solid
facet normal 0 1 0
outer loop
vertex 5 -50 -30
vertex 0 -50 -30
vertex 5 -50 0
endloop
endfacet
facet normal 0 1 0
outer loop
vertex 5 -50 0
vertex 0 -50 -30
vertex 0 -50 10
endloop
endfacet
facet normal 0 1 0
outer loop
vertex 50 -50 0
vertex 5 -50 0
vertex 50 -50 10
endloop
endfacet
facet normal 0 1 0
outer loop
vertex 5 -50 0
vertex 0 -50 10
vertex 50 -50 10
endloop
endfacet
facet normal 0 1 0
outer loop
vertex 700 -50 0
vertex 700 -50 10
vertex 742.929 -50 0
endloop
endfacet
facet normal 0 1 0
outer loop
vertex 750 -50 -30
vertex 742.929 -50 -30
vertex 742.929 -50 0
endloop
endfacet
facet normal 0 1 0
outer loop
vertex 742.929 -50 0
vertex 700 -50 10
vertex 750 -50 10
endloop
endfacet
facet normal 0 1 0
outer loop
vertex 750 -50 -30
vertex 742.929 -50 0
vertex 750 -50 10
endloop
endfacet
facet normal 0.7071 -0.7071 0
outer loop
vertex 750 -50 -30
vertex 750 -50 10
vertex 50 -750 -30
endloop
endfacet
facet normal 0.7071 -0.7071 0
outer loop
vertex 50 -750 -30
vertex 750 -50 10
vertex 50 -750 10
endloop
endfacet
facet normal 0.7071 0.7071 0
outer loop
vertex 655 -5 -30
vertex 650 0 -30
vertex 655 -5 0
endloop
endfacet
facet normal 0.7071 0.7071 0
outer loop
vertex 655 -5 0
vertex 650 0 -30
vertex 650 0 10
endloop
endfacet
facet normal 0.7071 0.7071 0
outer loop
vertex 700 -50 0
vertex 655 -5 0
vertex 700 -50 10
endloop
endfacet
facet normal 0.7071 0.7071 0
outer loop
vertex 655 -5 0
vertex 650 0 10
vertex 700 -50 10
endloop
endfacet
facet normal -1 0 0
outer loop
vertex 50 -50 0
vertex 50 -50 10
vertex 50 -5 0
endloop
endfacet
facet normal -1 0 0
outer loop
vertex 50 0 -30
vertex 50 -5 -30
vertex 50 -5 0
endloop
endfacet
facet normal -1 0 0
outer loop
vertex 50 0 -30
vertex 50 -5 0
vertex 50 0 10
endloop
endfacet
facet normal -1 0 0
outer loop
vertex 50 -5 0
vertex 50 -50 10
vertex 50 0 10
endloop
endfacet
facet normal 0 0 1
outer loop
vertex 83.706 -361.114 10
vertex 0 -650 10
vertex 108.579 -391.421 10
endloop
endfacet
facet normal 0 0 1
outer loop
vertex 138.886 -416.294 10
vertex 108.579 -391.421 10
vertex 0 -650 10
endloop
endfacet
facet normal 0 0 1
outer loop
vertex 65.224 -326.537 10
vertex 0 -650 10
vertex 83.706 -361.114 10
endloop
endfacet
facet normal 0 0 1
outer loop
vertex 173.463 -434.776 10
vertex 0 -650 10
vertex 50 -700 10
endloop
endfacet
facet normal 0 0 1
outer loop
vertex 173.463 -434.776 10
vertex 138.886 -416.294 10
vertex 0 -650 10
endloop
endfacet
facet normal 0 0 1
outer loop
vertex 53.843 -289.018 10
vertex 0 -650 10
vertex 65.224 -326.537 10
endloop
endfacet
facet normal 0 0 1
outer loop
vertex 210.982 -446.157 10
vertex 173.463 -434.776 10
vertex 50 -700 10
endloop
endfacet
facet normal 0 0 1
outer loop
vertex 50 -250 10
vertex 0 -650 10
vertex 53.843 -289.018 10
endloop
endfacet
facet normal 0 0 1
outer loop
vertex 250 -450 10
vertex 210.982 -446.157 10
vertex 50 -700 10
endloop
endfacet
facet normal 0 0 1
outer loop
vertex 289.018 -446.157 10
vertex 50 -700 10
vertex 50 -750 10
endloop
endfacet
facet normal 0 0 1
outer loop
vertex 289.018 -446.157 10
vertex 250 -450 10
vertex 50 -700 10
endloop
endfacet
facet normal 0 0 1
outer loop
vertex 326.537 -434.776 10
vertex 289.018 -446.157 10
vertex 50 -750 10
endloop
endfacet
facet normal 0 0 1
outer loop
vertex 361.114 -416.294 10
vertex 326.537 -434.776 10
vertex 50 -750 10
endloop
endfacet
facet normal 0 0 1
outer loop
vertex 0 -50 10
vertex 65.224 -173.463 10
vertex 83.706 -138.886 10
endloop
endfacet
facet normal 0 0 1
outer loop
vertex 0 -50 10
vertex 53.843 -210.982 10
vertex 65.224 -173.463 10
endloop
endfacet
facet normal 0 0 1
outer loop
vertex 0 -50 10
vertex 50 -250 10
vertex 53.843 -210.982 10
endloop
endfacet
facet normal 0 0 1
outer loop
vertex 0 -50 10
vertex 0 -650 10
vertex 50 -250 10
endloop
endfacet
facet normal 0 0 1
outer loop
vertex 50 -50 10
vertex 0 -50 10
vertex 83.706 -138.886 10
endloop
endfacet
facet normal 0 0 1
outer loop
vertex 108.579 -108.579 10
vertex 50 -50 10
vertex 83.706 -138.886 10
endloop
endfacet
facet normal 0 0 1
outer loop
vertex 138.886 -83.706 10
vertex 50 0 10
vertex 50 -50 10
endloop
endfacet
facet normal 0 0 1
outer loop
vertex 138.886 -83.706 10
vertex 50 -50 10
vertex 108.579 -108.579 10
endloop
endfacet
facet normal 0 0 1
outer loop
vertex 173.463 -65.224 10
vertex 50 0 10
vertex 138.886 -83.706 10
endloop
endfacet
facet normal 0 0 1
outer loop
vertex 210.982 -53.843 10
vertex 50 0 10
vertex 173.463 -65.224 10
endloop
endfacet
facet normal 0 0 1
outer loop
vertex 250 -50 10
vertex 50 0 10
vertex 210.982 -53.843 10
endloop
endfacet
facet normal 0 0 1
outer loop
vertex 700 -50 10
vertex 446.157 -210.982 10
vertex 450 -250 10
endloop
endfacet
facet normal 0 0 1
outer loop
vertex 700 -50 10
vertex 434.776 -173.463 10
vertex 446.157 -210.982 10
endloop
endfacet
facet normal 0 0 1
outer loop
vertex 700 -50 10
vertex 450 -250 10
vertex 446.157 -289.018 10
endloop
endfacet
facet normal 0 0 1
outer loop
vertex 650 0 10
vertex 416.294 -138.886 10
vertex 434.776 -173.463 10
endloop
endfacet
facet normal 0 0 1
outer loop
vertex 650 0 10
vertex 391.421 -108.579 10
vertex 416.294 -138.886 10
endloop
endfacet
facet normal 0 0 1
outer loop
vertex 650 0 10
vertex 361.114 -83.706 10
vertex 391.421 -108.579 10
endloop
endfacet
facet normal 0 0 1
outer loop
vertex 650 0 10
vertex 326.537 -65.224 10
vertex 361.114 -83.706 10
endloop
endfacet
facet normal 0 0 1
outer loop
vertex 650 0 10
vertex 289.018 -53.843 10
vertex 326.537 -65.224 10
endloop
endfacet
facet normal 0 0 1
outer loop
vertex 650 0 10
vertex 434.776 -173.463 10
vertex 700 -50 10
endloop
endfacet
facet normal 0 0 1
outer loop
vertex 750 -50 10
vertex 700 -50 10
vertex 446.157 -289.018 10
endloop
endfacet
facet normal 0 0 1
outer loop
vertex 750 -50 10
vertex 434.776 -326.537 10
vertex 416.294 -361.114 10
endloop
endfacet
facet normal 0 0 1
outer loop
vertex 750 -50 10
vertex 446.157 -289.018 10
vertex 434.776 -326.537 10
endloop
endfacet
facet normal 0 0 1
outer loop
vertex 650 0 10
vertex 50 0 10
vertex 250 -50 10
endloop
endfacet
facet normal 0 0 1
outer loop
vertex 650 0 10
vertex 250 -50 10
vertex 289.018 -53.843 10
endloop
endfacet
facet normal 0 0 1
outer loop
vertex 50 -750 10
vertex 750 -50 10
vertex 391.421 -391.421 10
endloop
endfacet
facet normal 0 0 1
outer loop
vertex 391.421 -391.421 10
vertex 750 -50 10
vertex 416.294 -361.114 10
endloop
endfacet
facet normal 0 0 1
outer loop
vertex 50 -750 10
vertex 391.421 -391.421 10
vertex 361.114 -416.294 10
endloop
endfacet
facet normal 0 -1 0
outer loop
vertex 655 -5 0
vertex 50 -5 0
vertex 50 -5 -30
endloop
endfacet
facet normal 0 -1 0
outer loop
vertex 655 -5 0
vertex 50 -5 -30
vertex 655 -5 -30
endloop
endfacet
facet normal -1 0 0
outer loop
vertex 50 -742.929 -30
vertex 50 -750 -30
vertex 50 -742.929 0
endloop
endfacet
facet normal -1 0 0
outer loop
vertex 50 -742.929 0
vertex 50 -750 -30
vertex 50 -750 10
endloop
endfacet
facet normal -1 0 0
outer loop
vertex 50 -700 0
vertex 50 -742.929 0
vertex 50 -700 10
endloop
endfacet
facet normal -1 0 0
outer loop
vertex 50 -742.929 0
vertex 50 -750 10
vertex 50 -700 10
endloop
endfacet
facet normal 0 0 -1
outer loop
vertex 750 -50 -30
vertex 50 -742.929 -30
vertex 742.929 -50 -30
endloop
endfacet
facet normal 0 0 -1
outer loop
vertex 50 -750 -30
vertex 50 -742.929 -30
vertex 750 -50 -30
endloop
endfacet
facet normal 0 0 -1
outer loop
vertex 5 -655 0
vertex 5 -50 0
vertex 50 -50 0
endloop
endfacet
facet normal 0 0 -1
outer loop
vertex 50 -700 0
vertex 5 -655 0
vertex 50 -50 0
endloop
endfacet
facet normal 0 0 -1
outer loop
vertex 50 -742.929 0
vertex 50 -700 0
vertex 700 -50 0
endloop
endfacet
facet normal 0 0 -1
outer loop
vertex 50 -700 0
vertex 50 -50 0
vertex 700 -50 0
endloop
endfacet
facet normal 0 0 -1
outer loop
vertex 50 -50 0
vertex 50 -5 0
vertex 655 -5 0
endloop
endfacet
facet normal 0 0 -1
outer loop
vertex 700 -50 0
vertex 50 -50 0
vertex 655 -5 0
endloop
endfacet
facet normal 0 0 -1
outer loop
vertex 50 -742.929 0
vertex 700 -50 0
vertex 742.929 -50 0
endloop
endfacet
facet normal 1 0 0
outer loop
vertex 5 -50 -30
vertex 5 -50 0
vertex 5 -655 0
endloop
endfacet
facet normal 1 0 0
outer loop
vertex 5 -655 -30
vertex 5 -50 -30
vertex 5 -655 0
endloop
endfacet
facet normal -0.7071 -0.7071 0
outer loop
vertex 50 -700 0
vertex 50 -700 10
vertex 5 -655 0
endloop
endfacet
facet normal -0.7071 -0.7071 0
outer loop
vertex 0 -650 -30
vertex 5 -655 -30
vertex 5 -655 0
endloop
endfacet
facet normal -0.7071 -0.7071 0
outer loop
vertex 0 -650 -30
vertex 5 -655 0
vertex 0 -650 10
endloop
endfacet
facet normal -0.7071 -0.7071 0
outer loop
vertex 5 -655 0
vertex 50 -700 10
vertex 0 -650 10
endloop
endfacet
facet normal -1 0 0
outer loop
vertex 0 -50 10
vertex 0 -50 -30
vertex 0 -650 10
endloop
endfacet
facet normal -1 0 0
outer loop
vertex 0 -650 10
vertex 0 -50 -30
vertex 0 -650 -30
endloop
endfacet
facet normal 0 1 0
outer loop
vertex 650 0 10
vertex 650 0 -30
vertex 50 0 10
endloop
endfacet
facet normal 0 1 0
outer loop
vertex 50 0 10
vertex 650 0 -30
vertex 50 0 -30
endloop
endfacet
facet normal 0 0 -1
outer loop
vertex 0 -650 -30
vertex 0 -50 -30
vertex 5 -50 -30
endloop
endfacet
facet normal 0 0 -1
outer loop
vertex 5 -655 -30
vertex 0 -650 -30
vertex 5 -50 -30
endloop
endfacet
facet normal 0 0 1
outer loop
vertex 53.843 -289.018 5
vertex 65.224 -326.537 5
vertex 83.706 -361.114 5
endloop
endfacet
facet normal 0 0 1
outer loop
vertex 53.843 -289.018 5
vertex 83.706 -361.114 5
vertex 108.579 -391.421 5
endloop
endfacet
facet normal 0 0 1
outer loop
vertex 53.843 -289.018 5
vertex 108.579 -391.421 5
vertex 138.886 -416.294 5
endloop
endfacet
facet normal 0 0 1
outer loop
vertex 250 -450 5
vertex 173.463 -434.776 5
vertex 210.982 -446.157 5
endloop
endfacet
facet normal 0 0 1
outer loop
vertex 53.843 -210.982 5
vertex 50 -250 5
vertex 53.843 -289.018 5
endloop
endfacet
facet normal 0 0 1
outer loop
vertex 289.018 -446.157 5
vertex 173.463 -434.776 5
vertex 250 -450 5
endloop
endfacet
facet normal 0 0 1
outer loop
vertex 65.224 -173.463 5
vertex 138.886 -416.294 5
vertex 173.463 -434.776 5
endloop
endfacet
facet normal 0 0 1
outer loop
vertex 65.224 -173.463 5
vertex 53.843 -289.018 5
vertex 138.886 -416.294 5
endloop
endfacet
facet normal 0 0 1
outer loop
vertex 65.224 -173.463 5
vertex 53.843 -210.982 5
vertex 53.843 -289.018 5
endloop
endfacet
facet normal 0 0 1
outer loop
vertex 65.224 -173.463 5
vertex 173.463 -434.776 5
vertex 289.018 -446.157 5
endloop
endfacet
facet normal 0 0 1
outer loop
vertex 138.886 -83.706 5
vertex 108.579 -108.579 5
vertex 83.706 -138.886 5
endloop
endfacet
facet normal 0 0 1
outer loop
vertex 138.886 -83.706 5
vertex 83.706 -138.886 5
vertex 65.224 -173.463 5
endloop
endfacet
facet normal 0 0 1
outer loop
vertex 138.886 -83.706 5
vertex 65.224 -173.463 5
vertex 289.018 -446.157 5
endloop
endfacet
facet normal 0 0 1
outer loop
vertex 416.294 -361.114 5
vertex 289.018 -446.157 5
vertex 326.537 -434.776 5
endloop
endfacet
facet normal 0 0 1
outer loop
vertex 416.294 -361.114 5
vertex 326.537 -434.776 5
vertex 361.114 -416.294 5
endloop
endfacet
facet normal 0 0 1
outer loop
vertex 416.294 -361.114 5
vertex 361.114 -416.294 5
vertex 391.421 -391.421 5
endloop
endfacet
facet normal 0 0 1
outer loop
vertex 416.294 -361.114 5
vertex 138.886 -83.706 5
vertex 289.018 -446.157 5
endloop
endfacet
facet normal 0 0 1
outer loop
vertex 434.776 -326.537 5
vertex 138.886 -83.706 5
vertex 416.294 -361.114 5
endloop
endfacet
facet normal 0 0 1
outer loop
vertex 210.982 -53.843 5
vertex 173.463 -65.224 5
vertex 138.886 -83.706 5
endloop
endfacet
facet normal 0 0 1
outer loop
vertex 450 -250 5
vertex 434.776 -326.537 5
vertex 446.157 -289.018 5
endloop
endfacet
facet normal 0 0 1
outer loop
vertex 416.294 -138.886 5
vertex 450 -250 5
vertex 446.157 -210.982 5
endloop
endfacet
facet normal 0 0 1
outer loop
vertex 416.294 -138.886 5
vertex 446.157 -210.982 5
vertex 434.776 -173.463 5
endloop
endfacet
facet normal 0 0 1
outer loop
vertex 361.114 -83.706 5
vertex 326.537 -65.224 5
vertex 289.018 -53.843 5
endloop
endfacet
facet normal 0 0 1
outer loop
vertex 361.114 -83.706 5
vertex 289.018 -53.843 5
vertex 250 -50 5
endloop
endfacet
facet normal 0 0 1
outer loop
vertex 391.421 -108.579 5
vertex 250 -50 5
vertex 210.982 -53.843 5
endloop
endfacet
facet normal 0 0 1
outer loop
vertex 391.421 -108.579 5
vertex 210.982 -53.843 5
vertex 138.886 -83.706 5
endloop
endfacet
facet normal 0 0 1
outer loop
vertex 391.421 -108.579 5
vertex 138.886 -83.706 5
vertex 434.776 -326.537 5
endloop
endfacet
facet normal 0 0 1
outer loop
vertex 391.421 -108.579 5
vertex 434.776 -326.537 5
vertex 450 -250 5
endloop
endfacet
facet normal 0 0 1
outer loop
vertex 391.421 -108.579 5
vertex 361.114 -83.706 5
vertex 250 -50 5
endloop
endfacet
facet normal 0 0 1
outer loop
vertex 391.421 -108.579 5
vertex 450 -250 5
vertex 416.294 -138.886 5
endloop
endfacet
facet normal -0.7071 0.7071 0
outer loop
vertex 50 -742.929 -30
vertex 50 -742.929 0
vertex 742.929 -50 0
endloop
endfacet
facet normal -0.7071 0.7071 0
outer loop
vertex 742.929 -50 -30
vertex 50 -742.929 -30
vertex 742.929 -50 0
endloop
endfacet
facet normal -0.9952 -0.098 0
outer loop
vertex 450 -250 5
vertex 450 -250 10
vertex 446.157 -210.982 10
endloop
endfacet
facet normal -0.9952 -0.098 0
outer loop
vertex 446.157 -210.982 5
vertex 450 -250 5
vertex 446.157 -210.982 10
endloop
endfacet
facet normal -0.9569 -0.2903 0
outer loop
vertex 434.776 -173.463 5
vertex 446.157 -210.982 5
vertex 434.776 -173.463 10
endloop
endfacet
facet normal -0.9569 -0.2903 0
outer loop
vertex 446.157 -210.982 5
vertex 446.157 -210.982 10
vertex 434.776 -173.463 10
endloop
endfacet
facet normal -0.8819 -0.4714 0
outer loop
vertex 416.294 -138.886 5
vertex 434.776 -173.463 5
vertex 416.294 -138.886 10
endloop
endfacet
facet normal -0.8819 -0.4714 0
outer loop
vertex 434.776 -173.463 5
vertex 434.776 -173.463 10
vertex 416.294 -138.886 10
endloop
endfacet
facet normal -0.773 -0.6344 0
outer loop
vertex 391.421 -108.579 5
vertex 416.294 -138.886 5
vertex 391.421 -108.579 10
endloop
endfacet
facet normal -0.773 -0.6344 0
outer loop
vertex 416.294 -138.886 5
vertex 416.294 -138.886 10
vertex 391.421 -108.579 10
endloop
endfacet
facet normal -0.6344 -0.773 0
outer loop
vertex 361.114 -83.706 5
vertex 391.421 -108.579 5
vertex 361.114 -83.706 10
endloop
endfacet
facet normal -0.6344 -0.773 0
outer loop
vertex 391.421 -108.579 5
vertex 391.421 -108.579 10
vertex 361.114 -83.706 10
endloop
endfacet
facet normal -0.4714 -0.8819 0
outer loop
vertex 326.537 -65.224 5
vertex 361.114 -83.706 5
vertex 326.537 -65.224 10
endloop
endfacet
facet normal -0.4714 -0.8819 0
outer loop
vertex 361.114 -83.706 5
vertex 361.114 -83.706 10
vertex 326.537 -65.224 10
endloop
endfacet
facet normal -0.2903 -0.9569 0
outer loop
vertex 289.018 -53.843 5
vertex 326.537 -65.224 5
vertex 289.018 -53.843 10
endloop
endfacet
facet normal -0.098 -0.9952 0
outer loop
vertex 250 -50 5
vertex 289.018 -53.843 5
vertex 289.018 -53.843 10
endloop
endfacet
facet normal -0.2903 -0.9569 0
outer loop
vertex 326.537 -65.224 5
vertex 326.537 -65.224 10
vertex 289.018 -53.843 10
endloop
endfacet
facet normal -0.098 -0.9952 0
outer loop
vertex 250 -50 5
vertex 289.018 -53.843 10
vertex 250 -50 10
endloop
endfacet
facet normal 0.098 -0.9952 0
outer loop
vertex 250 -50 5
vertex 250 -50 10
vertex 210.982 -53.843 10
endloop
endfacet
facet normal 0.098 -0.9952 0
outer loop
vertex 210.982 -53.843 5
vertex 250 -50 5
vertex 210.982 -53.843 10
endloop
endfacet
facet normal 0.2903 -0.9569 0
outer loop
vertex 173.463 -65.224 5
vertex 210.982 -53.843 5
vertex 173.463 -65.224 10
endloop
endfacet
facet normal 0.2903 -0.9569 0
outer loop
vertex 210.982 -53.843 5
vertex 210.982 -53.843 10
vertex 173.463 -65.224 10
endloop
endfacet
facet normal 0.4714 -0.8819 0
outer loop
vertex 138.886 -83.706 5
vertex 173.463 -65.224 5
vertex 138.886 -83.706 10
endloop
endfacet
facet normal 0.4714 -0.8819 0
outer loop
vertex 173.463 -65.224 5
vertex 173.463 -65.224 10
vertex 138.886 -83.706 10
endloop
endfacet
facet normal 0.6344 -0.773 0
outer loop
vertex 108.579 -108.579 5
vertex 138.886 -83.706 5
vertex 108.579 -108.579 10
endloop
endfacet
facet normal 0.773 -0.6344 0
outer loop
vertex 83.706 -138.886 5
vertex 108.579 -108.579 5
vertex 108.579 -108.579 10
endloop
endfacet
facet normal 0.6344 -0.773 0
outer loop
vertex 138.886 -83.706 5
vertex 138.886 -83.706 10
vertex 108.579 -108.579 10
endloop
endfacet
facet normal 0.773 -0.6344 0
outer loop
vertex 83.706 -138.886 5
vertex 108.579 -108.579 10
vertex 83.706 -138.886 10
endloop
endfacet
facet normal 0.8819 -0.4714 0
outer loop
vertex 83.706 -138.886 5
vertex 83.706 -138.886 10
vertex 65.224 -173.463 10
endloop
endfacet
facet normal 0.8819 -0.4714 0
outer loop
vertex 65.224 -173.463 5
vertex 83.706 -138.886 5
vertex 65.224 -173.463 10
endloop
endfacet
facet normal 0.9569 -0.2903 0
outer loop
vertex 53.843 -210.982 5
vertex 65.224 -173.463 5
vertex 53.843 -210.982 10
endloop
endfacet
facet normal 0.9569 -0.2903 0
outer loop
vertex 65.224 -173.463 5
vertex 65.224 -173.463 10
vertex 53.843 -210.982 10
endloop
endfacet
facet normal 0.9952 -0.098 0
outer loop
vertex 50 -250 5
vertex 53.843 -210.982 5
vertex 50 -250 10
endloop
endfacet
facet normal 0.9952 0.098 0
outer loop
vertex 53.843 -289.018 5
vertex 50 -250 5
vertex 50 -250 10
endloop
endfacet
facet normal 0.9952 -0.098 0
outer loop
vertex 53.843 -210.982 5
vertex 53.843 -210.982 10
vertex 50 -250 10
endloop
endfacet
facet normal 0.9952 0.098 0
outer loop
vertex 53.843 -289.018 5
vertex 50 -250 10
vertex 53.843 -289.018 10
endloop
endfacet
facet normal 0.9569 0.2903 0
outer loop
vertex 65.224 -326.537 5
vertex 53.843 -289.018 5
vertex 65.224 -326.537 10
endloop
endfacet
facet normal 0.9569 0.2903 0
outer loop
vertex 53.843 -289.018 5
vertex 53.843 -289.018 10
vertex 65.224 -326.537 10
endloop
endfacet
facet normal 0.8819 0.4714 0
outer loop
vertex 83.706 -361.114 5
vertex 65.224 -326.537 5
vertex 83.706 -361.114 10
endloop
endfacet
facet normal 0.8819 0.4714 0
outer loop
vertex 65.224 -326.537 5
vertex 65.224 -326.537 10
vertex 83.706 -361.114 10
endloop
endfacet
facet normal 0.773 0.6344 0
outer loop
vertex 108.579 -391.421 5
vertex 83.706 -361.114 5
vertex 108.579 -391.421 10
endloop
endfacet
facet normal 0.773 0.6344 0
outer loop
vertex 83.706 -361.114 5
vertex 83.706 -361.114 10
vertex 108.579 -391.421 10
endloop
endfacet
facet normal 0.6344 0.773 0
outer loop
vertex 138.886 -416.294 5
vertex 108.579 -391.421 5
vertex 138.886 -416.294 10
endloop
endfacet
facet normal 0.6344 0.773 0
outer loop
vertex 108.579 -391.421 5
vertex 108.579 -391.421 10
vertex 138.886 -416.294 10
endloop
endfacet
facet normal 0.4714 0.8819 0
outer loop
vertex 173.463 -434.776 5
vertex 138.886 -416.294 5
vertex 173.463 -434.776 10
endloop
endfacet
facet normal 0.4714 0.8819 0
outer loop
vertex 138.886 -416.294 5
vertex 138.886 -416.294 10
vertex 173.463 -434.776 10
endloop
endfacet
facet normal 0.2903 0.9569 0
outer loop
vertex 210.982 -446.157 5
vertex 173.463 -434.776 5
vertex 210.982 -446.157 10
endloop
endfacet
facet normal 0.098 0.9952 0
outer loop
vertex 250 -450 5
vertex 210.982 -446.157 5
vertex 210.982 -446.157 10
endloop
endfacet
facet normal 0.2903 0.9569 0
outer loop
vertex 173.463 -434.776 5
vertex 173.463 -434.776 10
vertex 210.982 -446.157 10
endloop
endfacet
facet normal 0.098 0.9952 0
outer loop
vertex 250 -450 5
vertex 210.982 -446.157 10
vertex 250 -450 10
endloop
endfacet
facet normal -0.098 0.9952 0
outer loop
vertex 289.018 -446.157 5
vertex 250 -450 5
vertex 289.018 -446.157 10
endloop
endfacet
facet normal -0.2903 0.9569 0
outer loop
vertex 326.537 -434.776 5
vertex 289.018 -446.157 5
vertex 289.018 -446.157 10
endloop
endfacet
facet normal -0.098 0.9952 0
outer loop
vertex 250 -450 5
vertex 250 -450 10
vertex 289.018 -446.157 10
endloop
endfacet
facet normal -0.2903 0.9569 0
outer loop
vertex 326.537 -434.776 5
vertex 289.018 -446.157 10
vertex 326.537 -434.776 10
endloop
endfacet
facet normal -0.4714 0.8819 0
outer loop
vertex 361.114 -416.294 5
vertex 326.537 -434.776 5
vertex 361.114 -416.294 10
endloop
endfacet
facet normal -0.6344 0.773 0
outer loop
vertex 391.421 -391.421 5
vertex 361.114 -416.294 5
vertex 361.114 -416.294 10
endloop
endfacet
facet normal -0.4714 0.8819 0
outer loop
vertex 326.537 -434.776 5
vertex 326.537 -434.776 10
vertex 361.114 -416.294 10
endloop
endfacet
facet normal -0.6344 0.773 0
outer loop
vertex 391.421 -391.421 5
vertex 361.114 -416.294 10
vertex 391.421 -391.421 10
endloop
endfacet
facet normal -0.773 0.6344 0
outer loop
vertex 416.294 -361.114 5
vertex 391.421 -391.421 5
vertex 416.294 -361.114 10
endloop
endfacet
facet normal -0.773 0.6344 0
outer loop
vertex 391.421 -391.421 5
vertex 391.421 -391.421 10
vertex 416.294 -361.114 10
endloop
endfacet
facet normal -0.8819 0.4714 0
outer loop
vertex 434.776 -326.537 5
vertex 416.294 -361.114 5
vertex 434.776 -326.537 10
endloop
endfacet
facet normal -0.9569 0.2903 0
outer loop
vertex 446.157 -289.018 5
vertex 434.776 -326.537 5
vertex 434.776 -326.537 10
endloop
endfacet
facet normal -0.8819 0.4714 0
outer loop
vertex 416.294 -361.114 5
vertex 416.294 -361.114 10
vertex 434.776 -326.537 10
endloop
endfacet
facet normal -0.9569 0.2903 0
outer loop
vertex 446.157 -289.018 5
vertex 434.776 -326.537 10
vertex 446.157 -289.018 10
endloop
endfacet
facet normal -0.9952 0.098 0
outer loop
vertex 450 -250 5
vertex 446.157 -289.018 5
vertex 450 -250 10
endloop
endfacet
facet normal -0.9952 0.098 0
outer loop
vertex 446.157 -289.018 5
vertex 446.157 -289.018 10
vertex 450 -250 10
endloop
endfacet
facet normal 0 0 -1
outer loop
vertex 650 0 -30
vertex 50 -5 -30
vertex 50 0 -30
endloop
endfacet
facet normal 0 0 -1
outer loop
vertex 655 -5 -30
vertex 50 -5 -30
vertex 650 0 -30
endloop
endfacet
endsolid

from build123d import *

# Parameters (mm, degrees)
F1_DEPTH  = 10
F2_R      = 5
F3_R      = 200
F4_DEPTH  = 5
F5_W      = 5
F5_H      = 690
F5_W_2    = 690
F5_H_2    = 5
F6_DEPTH  = 30
F7_W      = 50
F7_H      = 50
F8_DEPTH  = 40.001
F10_DEPTH = 40.001


with BuildPart() as f1:
    # F0 (on Top) → F1 (new body)
    with BuildSketch(Plane.XY):
        Polygon((750, 0), (0, 0), (0, -750), (50, -750), (750, -50), align=None)
    extrude(amount=F1_DEPTH)

    # F2
    f2_edges = [f1.edges().sort_by_distance(p)[0] for p in [
        (0, -750, 5),
        (750, 0, 5),
        (0, 0, 5),
    ]]
    fillet(f2_edges, radius=F2_R)

    # F3 (on face) → F4 (cut)
    with BuildSketch(Plane.XY.offset(10)):
        with Locations((250, -250)):
            Circle(F3_R)
    extrude(amount=-F4_DEPTH, mode=Mode.SUBTRACT)

    # F5 (on face) → F6 (join)
    with BuildSketch(Plane(origin=(0, 0, 0), x_dir=(1, 0, 0), z_dir=(0, 0, -1))):
        with Locations((2.5, 375)):
            Rectangle(F5_W, F5_H)
        with Locations((375, 2.5)):
            Rectangle(F5_W_2, F5_H_2)
        Polygon((750, 50), (50, 750), (46.4644660941, 746.4644660941), (746.4644660941, 46.4644660941), align=None)
    extrude(amount=F6_DEPTH)

    # F7 (on face) → F8 (cut, through all)
    with BuildSketch(Plane.XY.offset(10)):
        with Locations((25, -25)):
            Rectangle(F7_W, F7_H)
        with Locations((725, -25)):
            Rectangle(F7_W, F7_H)
        with Locations((25, -725)):
            Rectangle(F7_W, F7_H)
    extrude(amount=-F8_DEPTH, mode=Mode.SUBTRACT)

    # F9 (on face) → F10 (cut, through all)
    with BuildSketch(Plane.XY.offset(10)):
        Polygon((650, 0), (700, -50), (700, 0), align=None)
        Polygon((0, -650), (0, -700), (50, -700), align=None)
    extrude(amount=-F10_DEPTH, mode=Mode.SUBTRACT)


solid = f1.part
